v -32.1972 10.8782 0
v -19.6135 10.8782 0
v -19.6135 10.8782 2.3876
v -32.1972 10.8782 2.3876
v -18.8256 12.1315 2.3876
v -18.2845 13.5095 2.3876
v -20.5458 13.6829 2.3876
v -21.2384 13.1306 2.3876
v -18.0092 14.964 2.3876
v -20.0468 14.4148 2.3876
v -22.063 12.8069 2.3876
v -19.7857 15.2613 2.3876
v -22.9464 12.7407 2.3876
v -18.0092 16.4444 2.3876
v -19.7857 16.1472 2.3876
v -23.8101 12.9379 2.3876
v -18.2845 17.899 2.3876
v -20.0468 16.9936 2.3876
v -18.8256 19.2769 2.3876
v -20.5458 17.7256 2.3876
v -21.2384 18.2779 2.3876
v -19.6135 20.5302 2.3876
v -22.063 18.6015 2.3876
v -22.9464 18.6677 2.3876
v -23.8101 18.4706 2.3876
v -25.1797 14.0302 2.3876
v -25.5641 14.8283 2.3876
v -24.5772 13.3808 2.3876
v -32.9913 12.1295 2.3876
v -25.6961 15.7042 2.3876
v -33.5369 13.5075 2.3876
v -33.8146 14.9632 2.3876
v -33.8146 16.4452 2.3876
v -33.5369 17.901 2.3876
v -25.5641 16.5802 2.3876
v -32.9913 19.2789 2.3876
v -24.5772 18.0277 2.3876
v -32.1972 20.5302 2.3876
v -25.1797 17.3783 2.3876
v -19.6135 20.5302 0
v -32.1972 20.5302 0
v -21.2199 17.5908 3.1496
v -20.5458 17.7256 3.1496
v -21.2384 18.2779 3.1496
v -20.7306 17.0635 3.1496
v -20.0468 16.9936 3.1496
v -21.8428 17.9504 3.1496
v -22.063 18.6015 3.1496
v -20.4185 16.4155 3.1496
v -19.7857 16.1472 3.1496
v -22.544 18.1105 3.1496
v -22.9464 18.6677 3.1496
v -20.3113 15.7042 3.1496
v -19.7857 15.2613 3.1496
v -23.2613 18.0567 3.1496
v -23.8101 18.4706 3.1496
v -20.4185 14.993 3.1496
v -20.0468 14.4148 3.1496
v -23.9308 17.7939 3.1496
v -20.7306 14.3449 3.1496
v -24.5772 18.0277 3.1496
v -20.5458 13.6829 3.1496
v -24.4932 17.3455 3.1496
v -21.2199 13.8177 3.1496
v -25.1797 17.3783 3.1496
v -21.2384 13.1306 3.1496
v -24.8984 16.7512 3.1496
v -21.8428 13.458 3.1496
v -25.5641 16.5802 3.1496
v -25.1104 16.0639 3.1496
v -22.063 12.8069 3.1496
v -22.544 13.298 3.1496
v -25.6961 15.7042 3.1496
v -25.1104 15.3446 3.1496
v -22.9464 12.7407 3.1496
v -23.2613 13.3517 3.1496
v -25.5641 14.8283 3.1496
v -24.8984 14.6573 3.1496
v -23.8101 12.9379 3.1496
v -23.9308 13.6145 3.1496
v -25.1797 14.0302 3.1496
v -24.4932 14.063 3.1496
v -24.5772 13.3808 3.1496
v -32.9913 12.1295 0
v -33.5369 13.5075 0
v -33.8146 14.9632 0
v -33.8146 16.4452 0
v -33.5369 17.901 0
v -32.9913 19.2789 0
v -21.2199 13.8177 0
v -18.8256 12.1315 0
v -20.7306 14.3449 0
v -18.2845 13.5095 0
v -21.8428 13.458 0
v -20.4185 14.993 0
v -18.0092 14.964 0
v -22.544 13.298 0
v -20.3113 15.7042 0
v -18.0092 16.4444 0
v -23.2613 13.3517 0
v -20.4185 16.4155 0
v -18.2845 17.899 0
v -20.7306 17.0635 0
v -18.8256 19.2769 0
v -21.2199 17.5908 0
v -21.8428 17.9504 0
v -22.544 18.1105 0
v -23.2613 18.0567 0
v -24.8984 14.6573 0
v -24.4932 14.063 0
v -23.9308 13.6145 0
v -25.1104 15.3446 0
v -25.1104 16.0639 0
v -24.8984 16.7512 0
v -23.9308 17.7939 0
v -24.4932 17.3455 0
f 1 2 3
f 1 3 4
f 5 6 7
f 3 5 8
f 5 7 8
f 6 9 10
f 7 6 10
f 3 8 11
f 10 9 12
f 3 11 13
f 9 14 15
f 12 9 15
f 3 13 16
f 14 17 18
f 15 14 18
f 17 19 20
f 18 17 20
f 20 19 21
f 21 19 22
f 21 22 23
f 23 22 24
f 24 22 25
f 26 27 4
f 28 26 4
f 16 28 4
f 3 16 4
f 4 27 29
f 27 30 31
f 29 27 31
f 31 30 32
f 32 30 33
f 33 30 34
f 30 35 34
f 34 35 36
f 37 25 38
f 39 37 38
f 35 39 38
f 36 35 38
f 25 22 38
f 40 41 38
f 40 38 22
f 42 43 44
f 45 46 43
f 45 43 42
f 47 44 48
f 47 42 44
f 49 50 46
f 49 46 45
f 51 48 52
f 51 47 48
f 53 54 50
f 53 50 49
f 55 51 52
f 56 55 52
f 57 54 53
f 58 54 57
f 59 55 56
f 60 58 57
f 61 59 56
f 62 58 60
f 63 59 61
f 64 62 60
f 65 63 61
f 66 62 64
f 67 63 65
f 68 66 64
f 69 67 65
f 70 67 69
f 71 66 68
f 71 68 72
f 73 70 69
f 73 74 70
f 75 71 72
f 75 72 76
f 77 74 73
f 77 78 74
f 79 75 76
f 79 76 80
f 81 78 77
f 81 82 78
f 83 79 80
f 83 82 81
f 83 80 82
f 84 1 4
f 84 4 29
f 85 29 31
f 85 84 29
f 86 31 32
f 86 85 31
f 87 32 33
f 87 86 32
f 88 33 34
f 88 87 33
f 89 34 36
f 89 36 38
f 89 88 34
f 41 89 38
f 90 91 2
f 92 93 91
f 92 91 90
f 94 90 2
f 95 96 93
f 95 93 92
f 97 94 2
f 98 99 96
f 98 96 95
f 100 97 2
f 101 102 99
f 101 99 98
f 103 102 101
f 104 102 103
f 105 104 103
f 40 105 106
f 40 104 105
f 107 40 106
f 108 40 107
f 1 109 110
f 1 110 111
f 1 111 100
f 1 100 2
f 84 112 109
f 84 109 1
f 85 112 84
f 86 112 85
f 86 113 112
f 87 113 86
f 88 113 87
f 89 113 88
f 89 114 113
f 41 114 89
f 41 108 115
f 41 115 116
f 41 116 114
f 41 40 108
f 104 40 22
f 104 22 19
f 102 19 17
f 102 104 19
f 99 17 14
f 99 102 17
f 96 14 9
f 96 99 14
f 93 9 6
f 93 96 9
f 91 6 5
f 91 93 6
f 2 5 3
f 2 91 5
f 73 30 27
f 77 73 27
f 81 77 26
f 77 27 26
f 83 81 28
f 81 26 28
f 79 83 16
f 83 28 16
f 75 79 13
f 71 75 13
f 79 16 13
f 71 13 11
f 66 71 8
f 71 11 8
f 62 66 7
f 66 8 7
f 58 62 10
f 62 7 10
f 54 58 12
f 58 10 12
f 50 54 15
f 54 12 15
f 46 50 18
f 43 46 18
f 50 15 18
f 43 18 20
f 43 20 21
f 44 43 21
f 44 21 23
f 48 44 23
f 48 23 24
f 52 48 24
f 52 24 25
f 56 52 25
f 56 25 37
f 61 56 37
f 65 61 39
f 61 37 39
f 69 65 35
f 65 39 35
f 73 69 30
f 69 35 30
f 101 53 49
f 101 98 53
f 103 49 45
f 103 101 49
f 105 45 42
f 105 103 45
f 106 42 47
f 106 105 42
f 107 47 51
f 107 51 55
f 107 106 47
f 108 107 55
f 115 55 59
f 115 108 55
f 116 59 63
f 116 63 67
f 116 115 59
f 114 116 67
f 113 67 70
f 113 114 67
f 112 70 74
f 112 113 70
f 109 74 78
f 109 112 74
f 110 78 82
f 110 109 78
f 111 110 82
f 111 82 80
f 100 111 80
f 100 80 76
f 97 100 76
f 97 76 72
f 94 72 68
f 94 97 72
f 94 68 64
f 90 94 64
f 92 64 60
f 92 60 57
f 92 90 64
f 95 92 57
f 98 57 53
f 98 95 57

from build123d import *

# Parameters (mm, degrees)
SKETCH1_R      = 2.413
EXTRUDE1_DEPTH = 2.3876
SKETCH2_R      = 2.9718
SKETCH2_R_2    = 2.413
EXTRUDE2_DEPTH = 0.762


with BuildPart() as part:
    # Sketch1 → Extrude1 (new body)
    with BuildSketch(Plane.XY):
        with BuildLine():
            Line((-32.197236546, 20.530230269), (-19.613461217, 20.530230269))
            ThreePointArc((-19.613461217, 20.530230269), (-17.9745326, 15.704230269), (-19.613461217, 10.878230269))
            Line((-19.613461217, 10.878230269), (-32.197236546, 10.878230269))
            ThreePointArc((-32.197236546, 10.878230269), (-33.8495326, 15.704230269), (-32.197236546, 20.530230269))
        make_face()
        with Locations((-22.7243326, 15.704230269)):
            Circle(SKETCH1_R, mode=Mode.SUBTRACT)
    extrude(amount=EXTRUDE1_DEPTH)

    # Sketch2 → Extrude2 (add)
    with BuildSketch(Plane.XY.offset(2.3876)):
        with Locations(Location((-22.7243326, 15.704230269, 0), (0, 0, 180))):
            Circle(SKETCH2_R)
        with Locations((-22.7243326, 15.704230269)):
            Circle(SKETCH2_R_2, mode=Mode.SUBTRACT)
    extrude(amount=EXTRUDE2_DEPTH)


solid = part.part
